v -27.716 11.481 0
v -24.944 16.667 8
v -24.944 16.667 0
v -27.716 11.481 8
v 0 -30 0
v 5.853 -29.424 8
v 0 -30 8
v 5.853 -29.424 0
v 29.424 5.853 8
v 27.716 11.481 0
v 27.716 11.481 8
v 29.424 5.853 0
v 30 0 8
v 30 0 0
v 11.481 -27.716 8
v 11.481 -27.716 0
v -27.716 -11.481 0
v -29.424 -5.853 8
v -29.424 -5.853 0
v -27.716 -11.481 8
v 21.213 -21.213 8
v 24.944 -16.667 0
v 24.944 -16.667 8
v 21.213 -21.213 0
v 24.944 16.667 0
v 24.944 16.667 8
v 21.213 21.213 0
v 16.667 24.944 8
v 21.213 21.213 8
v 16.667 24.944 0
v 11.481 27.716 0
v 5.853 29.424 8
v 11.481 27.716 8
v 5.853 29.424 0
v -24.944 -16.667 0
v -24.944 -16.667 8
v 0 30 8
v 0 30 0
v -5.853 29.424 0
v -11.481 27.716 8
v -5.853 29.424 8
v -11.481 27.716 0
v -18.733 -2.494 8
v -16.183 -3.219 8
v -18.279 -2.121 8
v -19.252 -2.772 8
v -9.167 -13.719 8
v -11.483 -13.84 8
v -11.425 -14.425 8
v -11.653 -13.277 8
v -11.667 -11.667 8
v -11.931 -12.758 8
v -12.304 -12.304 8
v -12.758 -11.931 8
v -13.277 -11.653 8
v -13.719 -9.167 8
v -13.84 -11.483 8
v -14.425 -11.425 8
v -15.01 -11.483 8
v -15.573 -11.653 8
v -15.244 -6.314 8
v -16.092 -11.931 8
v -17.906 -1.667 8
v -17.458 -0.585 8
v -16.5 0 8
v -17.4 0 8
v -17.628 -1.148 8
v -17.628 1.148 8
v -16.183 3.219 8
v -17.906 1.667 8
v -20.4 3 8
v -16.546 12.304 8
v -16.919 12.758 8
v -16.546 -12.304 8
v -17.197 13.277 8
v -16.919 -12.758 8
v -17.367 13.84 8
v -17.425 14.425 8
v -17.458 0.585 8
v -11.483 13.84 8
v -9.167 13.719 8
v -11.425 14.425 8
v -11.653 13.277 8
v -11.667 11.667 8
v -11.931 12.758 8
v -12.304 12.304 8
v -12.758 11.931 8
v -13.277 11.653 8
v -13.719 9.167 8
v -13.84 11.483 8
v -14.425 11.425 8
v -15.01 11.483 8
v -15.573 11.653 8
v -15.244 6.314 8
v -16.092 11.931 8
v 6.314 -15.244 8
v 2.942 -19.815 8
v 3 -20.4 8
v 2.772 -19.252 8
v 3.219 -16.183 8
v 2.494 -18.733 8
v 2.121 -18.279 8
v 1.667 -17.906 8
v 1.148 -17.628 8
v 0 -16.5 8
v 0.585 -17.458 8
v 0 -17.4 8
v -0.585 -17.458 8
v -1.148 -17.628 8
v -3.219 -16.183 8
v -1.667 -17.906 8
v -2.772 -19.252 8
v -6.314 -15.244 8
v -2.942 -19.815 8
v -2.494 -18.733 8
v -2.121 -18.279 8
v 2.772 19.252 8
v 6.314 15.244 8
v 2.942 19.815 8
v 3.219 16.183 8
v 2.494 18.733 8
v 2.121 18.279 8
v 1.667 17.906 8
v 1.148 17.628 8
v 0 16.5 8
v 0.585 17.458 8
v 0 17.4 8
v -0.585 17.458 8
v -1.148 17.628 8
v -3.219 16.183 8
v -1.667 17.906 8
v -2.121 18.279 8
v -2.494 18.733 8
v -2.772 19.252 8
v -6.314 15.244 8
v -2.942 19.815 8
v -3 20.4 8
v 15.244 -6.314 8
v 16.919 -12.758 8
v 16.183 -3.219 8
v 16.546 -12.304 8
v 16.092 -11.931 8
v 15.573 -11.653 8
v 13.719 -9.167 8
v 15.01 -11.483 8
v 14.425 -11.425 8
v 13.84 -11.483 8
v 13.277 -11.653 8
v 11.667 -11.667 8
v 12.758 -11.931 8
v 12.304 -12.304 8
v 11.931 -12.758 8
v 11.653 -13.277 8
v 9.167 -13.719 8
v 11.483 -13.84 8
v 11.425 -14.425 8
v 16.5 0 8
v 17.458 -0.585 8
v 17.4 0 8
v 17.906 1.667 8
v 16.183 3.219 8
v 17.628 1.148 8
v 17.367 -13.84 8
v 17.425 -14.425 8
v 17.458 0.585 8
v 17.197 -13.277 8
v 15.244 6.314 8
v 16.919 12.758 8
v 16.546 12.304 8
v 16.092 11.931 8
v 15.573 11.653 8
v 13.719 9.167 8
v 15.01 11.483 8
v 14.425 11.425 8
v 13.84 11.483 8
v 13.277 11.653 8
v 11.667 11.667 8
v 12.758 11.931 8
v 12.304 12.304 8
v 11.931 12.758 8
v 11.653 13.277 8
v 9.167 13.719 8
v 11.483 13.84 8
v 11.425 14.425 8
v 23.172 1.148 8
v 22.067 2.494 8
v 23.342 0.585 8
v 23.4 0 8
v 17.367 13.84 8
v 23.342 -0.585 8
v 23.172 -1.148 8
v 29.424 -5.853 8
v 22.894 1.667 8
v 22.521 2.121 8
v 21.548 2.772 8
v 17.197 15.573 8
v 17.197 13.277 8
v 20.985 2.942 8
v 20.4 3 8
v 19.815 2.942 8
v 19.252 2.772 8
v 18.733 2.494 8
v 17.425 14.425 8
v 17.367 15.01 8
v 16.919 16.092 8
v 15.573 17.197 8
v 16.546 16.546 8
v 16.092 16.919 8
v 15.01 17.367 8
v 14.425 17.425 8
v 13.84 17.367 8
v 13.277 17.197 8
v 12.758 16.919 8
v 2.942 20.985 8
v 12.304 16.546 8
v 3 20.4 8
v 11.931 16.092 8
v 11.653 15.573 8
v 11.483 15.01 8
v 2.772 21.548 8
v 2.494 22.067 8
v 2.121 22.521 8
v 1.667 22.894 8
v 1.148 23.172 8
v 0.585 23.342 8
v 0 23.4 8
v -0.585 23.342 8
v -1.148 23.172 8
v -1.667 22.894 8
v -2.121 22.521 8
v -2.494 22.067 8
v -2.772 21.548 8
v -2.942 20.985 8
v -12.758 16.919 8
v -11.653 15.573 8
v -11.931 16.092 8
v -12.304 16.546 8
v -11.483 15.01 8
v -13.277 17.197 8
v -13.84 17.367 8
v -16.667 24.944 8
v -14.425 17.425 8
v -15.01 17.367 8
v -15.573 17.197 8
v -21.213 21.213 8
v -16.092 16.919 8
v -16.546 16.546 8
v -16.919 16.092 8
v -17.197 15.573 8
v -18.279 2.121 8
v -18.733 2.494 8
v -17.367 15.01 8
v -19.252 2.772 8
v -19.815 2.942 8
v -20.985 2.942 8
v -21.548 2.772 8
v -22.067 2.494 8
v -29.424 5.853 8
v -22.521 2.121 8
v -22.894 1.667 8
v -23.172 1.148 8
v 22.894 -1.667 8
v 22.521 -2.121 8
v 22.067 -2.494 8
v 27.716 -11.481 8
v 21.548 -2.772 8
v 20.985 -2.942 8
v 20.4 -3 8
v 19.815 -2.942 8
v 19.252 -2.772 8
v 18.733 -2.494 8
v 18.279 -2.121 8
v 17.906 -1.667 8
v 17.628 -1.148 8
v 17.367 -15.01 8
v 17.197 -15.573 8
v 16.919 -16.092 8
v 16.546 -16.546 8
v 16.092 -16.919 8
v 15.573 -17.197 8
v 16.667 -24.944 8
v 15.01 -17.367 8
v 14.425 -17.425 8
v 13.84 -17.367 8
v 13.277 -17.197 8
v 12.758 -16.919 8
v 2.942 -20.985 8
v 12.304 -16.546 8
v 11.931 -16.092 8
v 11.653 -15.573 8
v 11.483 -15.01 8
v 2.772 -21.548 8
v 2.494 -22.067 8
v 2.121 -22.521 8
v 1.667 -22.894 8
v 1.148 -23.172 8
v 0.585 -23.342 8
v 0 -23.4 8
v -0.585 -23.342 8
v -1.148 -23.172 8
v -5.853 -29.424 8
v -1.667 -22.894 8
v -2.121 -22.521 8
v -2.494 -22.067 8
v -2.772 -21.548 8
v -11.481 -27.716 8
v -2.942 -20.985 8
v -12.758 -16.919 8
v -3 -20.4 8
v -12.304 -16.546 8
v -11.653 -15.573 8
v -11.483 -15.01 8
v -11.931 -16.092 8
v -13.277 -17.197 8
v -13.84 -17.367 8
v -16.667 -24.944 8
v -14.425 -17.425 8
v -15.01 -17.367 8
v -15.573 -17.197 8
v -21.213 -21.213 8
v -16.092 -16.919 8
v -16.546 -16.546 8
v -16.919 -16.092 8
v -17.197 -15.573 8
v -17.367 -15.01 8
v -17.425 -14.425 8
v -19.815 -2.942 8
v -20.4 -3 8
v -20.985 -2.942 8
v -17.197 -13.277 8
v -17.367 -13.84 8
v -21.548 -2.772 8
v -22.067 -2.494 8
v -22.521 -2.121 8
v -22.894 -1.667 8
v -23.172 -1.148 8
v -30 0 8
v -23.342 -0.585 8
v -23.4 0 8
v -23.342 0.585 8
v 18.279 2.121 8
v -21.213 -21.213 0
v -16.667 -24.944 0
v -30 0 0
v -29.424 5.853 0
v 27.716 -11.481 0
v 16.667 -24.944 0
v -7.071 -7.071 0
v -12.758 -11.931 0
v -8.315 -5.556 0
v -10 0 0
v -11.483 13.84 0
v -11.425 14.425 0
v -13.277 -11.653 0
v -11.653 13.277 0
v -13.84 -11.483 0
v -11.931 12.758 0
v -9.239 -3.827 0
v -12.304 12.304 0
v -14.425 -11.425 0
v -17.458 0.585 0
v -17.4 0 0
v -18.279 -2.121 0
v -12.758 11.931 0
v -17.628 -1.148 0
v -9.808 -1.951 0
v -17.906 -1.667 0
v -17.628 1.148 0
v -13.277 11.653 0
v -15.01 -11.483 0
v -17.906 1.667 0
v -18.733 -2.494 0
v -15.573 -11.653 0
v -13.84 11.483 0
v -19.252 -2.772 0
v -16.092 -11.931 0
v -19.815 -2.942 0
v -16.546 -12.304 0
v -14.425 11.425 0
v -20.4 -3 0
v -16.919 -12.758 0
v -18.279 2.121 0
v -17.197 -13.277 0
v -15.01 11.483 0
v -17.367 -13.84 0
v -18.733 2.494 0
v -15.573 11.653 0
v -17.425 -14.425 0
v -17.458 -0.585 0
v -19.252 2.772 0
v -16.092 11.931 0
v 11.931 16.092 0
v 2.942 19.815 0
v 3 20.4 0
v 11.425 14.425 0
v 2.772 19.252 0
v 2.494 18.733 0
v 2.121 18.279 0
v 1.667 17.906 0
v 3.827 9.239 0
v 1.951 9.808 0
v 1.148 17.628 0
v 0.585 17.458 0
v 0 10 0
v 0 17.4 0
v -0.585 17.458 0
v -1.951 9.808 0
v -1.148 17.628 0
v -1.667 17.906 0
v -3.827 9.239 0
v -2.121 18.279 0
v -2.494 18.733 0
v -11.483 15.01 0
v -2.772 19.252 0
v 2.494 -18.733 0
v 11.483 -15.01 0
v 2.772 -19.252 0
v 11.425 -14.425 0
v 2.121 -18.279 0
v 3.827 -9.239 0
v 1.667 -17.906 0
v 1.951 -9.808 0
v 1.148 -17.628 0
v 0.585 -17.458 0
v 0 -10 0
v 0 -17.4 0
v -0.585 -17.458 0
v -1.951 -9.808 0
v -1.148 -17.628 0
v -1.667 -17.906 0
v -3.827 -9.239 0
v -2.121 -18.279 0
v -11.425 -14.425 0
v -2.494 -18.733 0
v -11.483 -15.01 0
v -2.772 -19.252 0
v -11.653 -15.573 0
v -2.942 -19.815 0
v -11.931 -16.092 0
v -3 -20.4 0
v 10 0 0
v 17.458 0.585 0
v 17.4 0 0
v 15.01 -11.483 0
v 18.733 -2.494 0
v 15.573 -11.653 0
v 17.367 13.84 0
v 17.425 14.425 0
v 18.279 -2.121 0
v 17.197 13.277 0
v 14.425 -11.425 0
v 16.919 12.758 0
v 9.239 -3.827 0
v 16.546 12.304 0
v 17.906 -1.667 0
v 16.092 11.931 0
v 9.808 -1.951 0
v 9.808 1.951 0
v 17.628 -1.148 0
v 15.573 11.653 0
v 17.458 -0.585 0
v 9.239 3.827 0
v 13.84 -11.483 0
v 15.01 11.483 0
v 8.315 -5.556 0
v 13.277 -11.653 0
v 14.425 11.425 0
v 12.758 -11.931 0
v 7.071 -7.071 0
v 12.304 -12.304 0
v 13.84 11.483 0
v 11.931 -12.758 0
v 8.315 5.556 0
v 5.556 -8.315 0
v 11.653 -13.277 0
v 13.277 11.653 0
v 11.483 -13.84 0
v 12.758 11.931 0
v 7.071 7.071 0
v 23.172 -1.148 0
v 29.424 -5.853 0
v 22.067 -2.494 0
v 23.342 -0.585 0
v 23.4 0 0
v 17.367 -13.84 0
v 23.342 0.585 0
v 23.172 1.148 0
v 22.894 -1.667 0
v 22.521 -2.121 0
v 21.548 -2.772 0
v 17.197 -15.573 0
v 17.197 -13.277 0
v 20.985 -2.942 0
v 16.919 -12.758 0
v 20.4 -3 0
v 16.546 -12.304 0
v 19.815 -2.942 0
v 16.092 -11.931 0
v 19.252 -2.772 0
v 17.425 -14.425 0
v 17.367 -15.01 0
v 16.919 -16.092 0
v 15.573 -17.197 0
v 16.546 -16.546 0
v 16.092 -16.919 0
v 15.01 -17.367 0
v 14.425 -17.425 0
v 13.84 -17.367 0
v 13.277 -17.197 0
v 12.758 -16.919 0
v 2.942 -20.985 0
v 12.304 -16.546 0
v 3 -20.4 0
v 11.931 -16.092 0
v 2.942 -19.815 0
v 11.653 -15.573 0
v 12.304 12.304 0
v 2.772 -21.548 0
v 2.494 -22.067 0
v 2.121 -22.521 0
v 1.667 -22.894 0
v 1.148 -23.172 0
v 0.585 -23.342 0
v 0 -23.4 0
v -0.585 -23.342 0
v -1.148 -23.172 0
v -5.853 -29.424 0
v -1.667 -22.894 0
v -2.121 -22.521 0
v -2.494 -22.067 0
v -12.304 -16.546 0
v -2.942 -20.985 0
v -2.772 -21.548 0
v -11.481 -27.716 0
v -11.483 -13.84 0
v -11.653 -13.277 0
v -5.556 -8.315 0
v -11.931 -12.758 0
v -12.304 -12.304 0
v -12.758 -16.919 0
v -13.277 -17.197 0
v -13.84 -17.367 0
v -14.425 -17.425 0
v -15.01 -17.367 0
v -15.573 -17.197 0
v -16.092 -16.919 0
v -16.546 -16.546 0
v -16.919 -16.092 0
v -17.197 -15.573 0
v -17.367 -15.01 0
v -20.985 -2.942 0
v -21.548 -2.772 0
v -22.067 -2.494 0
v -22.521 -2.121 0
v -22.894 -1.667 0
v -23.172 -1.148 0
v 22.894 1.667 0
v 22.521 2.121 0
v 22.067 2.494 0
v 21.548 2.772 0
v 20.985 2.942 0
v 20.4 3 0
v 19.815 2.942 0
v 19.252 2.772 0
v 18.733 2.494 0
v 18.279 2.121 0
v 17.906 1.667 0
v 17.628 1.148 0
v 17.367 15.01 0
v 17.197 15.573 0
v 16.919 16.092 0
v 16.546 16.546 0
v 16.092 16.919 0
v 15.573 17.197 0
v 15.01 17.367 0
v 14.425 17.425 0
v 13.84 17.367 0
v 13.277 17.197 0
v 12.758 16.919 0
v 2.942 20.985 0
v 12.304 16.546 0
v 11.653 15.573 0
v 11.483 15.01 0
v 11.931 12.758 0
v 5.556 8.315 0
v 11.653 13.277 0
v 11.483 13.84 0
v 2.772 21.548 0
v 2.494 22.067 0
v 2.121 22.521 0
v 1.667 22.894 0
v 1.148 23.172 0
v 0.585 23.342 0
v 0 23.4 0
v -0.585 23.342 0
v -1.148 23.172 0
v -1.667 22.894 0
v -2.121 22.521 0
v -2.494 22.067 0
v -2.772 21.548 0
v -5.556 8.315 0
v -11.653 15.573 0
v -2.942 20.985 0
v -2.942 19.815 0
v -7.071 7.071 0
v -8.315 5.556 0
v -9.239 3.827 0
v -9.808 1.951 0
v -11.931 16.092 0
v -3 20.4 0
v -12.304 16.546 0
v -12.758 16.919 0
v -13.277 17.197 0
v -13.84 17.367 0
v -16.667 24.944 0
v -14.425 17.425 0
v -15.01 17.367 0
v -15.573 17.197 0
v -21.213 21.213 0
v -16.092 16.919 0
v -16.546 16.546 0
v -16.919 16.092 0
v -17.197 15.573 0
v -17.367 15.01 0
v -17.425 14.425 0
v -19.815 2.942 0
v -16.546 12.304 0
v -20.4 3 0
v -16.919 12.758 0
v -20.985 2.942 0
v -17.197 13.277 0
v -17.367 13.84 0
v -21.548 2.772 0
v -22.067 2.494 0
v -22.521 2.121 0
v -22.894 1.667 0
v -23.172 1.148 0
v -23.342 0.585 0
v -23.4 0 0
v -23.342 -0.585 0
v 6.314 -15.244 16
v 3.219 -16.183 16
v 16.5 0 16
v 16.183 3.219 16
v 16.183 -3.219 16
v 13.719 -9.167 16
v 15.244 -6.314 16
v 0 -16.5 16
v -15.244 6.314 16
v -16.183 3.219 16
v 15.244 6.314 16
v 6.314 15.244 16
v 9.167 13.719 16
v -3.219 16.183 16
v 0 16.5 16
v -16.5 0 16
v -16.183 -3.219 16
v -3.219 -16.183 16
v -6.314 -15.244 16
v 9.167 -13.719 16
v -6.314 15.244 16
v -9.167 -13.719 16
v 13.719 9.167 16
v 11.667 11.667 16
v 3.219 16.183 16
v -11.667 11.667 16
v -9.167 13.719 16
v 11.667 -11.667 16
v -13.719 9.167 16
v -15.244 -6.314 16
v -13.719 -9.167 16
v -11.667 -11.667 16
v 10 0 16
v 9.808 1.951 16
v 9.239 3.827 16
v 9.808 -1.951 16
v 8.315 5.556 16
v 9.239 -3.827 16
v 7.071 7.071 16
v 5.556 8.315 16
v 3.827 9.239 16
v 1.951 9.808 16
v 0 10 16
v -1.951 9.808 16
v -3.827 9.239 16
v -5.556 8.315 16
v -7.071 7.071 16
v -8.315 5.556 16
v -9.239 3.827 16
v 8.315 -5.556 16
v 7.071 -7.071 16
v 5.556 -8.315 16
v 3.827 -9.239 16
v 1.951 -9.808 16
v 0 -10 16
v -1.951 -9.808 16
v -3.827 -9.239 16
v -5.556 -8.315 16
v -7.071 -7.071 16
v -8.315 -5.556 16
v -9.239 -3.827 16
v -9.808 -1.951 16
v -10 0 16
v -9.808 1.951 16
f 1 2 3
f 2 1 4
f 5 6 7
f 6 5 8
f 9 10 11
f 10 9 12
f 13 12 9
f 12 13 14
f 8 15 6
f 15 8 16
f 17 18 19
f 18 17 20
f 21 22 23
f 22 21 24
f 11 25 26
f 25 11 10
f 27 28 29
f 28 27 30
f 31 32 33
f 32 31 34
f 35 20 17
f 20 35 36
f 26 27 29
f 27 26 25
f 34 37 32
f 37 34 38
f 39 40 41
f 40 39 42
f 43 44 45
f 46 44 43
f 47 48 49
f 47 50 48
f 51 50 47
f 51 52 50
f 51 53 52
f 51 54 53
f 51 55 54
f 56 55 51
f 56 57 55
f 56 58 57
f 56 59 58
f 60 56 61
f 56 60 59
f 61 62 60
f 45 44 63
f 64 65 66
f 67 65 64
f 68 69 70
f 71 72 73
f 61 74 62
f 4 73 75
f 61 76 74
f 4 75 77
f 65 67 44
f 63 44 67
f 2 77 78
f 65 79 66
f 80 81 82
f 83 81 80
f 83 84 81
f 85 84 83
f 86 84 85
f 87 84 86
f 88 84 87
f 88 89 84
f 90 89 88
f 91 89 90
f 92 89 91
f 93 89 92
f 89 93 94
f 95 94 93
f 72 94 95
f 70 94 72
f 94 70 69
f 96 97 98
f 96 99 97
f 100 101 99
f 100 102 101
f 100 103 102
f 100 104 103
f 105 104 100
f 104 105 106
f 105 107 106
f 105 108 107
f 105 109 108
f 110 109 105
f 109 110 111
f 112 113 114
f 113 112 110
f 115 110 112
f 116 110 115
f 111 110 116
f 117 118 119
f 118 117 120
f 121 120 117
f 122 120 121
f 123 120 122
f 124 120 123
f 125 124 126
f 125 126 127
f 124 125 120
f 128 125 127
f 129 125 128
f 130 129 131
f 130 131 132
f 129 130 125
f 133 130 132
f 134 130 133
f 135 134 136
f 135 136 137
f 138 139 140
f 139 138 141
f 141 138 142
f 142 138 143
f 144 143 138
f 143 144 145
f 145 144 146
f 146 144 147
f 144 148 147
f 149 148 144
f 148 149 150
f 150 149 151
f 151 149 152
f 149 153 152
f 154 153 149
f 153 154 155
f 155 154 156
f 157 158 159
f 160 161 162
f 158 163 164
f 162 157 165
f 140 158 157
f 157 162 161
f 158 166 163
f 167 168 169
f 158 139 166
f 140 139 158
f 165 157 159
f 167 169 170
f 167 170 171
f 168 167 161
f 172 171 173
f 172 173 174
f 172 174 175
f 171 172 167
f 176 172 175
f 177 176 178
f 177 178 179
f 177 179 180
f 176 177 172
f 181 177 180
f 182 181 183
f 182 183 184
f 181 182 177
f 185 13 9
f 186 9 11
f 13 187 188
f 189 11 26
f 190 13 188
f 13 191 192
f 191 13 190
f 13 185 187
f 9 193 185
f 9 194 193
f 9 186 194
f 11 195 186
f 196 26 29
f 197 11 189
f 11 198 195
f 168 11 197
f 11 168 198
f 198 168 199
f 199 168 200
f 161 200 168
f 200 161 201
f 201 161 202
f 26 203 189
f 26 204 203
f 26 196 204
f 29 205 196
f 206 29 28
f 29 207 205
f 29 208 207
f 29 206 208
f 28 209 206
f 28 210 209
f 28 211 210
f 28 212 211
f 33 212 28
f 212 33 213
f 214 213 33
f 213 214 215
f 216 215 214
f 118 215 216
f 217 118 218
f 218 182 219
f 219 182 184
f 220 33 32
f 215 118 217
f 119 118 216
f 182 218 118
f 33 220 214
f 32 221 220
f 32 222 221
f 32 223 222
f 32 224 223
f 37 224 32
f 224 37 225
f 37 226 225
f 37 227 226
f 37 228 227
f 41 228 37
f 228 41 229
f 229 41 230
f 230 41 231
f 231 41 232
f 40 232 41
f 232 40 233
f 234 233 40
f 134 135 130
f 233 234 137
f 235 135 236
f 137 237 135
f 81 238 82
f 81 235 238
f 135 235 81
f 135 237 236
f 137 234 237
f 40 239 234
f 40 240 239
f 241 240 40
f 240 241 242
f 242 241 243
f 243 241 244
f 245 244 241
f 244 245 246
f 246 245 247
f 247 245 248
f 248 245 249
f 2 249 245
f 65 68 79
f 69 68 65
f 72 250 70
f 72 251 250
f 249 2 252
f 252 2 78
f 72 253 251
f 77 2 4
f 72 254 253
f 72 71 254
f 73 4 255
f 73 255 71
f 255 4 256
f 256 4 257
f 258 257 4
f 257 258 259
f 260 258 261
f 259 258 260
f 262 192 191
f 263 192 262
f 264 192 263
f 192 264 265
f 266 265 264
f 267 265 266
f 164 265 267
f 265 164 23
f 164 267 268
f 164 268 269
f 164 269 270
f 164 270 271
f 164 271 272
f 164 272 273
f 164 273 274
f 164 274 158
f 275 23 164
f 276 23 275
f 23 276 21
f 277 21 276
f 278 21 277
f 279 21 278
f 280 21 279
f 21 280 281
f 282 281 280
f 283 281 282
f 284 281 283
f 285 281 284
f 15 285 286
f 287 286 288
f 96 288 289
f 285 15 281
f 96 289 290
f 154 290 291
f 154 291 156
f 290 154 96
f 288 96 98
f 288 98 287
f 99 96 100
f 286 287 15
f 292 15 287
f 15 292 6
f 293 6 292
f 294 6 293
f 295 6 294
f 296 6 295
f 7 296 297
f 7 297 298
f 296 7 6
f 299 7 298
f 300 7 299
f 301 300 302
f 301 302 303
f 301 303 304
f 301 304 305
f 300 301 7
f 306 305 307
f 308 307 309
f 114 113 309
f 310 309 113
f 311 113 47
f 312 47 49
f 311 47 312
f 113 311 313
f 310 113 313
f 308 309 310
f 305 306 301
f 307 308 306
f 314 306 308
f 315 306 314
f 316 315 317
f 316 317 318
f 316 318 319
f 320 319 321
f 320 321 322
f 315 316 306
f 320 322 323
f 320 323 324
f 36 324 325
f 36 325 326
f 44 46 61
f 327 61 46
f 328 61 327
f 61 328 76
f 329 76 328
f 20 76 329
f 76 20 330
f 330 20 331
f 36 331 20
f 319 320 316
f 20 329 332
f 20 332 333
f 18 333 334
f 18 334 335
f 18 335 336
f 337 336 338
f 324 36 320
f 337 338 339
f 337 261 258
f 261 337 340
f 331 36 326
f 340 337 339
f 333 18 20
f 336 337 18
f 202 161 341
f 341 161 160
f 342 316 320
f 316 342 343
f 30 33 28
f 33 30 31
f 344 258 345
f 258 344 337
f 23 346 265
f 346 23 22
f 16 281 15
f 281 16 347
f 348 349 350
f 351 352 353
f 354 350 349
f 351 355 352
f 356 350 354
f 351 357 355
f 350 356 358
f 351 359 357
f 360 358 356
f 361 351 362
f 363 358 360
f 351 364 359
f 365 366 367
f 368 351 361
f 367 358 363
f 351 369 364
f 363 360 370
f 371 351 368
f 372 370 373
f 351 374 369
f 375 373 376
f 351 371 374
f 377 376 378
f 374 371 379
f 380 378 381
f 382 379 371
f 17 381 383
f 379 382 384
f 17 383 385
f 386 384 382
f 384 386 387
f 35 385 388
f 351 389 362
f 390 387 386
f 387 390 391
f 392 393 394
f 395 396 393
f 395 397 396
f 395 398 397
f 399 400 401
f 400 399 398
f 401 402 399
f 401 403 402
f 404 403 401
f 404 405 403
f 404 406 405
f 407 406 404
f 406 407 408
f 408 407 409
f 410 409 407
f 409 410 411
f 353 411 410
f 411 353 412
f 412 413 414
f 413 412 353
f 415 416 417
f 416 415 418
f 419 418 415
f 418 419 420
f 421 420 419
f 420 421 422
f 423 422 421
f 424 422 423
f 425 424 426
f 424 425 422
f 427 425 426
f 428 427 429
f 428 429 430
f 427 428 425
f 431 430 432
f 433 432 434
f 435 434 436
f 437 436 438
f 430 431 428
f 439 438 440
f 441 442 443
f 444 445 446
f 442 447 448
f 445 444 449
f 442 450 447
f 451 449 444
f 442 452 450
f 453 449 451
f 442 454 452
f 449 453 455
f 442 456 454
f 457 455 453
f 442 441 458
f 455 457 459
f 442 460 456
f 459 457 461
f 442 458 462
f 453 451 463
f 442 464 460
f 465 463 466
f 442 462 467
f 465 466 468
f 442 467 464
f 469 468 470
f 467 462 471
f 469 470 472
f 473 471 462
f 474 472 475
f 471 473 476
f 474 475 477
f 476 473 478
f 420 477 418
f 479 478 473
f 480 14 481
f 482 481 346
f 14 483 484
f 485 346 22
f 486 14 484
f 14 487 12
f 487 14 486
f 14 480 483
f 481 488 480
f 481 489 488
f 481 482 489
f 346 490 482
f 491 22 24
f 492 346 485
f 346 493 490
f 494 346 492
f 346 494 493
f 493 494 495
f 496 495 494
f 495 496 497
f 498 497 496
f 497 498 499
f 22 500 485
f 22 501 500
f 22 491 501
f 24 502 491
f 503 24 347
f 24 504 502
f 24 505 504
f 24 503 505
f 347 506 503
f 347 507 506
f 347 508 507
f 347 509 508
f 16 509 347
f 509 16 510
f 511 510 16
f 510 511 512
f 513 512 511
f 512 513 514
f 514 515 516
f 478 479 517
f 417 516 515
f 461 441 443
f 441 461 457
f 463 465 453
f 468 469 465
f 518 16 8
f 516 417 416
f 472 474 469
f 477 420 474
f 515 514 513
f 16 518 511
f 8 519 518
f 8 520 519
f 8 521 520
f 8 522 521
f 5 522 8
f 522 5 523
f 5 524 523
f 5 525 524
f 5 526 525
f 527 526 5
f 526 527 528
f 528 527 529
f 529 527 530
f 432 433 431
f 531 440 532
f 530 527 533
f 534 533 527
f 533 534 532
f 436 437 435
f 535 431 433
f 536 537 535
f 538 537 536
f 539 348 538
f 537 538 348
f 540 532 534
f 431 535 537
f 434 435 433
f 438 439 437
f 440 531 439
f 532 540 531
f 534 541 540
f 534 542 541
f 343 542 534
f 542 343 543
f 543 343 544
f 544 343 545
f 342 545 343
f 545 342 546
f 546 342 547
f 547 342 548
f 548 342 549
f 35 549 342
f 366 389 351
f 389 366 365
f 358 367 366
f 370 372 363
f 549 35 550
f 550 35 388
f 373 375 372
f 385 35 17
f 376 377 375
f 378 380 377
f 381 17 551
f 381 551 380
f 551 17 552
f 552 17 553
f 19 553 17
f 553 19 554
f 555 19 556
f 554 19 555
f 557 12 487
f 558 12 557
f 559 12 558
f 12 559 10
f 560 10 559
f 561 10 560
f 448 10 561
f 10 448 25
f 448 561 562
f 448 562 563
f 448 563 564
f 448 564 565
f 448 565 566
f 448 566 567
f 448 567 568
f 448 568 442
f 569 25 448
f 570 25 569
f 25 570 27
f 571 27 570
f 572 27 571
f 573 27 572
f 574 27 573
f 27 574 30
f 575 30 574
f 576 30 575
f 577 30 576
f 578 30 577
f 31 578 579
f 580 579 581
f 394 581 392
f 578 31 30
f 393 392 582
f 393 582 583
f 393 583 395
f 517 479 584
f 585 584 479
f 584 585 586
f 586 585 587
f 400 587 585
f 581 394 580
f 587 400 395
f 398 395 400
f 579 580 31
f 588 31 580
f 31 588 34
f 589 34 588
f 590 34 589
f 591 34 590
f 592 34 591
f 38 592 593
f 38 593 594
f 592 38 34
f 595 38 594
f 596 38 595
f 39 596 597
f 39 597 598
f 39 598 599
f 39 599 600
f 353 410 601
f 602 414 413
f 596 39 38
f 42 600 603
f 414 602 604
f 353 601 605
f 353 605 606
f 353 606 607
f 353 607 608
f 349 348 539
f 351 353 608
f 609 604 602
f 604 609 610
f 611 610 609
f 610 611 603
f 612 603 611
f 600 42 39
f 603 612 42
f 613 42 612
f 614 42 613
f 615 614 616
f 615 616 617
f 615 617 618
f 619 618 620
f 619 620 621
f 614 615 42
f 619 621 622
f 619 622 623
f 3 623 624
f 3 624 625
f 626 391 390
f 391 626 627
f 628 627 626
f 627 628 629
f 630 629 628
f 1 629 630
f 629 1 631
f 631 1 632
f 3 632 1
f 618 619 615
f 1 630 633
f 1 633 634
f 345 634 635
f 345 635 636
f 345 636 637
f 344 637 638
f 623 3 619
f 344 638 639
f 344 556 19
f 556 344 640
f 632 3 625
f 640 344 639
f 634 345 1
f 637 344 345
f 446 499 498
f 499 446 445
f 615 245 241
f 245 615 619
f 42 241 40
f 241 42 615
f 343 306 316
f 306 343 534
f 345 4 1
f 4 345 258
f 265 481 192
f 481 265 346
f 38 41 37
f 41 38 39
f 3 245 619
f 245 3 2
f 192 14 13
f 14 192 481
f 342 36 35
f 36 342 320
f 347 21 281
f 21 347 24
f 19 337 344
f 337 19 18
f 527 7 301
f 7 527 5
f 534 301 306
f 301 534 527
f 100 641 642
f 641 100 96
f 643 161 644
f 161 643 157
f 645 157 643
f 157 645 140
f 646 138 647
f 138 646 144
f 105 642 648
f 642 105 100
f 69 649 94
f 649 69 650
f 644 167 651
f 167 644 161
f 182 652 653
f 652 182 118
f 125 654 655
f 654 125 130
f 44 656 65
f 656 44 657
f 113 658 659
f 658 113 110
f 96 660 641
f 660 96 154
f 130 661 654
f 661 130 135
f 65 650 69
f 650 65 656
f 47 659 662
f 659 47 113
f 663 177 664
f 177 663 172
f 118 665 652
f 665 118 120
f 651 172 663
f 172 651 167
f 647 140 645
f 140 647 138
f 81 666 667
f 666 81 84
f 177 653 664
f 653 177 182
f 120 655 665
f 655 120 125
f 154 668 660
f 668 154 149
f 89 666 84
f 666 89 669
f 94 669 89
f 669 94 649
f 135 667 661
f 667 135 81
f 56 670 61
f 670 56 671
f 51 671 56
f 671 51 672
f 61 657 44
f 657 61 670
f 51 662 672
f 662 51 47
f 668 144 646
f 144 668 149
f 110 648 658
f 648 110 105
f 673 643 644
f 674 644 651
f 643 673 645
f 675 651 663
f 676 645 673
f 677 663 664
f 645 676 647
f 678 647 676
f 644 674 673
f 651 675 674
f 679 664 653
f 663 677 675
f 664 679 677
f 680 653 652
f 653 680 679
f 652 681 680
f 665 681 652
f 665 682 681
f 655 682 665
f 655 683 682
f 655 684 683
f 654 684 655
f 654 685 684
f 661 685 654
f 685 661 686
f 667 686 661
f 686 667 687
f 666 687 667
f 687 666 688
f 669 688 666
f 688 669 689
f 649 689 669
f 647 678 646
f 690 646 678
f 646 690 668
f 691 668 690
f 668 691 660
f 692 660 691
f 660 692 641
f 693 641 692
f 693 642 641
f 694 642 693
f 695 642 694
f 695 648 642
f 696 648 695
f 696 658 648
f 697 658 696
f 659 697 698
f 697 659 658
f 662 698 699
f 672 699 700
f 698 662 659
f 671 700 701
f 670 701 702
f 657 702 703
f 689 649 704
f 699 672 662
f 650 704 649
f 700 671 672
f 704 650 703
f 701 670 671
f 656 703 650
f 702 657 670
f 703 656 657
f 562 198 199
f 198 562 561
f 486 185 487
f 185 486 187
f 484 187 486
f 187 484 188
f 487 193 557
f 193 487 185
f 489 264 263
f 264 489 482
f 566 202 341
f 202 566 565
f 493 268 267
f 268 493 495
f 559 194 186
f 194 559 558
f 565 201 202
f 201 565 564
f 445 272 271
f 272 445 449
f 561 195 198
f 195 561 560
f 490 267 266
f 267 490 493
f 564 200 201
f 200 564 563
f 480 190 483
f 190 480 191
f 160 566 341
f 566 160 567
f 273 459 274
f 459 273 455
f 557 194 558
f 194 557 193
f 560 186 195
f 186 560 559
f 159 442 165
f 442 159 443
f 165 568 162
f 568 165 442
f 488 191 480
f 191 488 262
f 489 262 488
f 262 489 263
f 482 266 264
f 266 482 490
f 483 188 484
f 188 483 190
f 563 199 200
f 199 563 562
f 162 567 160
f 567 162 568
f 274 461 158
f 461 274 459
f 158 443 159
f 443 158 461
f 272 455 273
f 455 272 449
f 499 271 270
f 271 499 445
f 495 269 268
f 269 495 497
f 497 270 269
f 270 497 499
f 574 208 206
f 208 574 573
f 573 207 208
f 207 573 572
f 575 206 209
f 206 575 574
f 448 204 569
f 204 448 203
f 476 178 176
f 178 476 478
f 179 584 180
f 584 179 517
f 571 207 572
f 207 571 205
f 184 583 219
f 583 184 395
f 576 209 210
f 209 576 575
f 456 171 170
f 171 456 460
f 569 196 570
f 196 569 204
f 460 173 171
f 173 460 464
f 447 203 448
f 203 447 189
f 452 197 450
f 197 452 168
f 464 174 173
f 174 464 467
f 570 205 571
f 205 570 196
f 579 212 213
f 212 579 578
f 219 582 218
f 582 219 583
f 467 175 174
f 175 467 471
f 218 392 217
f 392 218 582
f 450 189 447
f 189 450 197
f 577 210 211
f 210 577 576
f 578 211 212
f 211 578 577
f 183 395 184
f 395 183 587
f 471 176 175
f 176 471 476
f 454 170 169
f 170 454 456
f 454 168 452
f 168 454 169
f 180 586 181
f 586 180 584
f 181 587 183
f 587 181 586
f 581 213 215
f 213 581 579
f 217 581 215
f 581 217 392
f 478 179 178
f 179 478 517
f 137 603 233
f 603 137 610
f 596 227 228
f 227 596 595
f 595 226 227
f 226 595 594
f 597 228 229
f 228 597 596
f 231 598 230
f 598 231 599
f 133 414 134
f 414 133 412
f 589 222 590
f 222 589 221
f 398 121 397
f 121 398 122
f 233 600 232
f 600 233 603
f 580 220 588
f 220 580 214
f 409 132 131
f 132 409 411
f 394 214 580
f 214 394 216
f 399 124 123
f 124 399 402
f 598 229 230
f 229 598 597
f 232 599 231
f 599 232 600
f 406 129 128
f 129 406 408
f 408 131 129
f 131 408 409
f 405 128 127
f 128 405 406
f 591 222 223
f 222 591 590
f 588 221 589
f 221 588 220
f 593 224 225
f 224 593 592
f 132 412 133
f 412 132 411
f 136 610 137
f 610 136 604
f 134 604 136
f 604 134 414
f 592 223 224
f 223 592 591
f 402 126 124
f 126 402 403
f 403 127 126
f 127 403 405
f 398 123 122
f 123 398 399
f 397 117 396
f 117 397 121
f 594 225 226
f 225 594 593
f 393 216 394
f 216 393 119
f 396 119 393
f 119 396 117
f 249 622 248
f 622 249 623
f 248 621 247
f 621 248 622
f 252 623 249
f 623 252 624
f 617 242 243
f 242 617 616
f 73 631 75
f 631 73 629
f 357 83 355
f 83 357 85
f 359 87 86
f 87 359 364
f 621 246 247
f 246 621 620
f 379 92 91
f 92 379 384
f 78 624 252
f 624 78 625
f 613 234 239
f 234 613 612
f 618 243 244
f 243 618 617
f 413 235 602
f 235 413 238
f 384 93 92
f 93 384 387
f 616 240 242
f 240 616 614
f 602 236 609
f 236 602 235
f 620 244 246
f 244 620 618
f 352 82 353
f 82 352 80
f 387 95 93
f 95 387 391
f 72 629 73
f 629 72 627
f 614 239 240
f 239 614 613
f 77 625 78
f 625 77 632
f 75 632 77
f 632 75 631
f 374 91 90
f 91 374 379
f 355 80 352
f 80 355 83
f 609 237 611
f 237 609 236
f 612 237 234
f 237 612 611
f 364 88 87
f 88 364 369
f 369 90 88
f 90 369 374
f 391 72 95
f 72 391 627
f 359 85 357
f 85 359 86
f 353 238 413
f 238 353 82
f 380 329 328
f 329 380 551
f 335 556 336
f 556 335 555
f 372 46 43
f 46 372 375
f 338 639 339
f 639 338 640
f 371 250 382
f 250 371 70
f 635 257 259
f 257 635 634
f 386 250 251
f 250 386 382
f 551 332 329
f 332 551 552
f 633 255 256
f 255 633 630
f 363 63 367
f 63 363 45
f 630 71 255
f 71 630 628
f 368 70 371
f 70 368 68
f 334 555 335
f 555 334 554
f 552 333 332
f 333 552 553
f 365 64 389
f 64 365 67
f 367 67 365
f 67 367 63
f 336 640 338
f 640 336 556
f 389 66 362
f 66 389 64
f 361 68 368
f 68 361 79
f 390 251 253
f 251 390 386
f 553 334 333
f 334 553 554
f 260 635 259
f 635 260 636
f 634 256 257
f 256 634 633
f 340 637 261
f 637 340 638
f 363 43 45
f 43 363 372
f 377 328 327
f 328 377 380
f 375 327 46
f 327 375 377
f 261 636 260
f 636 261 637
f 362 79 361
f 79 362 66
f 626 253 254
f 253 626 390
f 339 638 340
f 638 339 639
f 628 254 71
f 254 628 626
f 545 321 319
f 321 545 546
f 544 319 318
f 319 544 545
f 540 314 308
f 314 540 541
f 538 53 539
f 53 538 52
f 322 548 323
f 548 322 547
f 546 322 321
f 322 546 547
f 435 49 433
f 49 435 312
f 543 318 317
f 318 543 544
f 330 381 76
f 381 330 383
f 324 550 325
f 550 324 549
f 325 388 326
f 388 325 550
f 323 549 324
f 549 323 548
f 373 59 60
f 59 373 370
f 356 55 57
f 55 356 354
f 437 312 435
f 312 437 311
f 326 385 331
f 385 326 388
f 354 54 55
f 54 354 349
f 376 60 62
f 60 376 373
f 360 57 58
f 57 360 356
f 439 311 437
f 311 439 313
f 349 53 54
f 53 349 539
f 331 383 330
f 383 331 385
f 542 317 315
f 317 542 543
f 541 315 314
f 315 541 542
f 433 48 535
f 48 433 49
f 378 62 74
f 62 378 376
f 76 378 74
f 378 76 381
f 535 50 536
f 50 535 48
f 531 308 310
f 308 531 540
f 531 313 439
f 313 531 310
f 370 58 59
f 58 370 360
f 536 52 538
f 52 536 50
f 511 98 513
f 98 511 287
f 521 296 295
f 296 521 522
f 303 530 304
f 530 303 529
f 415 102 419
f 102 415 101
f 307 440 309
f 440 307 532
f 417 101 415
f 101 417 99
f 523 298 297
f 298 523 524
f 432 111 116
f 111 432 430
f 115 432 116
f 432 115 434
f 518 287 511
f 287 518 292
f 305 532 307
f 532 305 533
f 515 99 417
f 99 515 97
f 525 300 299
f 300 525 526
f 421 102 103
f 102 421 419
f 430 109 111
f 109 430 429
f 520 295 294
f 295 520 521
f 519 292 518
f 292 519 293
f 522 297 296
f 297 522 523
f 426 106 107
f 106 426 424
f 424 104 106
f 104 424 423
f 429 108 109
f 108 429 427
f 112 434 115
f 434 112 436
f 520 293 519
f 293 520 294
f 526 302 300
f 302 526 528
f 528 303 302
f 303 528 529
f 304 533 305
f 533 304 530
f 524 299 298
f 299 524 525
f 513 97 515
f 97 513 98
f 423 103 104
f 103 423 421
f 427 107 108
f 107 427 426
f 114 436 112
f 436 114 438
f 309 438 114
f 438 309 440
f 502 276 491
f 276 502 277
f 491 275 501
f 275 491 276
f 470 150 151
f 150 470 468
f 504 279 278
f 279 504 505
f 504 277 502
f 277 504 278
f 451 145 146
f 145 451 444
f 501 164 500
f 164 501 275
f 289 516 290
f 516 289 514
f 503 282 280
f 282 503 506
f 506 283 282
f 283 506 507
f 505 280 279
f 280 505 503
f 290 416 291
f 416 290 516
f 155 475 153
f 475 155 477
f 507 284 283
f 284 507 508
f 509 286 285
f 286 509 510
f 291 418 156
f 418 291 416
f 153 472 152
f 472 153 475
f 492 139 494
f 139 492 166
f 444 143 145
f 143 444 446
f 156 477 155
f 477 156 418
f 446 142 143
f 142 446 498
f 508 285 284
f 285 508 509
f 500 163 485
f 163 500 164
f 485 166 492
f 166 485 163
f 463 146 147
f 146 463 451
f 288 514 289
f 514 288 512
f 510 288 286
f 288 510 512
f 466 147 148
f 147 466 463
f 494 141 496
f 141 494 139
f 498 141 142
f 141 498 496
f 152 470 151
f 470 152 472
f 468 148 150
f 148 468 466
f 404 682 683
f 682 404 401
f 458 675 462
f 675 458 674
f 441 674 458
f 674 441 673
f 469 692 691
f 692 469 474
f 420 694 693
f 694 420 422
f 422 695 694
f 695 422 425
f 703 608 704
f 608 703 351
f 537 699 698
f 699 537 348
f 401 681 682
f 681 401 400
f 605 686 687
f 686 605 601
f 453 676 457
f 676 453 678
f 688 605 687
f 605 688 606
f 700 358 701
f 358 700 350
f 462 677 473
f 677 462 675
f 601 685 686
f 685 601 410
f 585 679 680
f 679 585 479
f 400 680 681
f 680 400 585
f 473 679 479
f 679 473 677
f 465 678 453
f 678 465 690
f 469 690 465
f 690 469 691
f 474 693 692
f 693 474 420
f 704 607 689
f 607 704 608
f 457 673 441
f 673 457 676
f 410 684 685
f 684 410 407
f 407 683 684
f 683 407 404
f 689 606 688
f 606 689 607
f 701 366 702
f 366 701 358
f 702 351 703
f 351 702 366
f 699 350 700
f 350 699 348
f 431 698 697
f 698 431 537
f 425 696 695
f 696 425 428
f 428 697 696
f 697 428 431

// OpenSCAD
$fn = 32;

// ----------------------------------------------------------------------
// Bolt-circle flange: 60 mm outside, 8 bolt holes, bore 20 mm
// ----------------------------------------------------------------------

// --- parameters (mm) ---
flange_d = 60;            // flange outside diameter
flange_t = 8;             // flange thickness
bolts = 8;                // number of bolt holes
bolt_d = 6;               // bolt clearance
bolt_r = 20.4;            // bolt circle radius
bore_d = 20;              // centre bore
hub_d = 33;               // raised hub diameter
hub_h = 8;                // raised hub height

module body() {
  cylinder(h = flange_t, d = flange_d);
  /* raised hub, sunk 1 mm into the flange */
  translate([0, 0, flange_t - 1]) cylinder(h = hub_h + 1, d = hub_d);
}

difference() {
  body();
  /* bolt circle */
  for (i = [0 : bolts - 1]) rotate([0, 0, i * 360 / bolts]) translate([bolt_r, 0, -1]) cylinder(h = flange_t + hub_h + 3, d = bolt_d);
  translate([0, 0, -1]) cylinder(h = flange_t + hub_h + 3, d = bore_d);
}
